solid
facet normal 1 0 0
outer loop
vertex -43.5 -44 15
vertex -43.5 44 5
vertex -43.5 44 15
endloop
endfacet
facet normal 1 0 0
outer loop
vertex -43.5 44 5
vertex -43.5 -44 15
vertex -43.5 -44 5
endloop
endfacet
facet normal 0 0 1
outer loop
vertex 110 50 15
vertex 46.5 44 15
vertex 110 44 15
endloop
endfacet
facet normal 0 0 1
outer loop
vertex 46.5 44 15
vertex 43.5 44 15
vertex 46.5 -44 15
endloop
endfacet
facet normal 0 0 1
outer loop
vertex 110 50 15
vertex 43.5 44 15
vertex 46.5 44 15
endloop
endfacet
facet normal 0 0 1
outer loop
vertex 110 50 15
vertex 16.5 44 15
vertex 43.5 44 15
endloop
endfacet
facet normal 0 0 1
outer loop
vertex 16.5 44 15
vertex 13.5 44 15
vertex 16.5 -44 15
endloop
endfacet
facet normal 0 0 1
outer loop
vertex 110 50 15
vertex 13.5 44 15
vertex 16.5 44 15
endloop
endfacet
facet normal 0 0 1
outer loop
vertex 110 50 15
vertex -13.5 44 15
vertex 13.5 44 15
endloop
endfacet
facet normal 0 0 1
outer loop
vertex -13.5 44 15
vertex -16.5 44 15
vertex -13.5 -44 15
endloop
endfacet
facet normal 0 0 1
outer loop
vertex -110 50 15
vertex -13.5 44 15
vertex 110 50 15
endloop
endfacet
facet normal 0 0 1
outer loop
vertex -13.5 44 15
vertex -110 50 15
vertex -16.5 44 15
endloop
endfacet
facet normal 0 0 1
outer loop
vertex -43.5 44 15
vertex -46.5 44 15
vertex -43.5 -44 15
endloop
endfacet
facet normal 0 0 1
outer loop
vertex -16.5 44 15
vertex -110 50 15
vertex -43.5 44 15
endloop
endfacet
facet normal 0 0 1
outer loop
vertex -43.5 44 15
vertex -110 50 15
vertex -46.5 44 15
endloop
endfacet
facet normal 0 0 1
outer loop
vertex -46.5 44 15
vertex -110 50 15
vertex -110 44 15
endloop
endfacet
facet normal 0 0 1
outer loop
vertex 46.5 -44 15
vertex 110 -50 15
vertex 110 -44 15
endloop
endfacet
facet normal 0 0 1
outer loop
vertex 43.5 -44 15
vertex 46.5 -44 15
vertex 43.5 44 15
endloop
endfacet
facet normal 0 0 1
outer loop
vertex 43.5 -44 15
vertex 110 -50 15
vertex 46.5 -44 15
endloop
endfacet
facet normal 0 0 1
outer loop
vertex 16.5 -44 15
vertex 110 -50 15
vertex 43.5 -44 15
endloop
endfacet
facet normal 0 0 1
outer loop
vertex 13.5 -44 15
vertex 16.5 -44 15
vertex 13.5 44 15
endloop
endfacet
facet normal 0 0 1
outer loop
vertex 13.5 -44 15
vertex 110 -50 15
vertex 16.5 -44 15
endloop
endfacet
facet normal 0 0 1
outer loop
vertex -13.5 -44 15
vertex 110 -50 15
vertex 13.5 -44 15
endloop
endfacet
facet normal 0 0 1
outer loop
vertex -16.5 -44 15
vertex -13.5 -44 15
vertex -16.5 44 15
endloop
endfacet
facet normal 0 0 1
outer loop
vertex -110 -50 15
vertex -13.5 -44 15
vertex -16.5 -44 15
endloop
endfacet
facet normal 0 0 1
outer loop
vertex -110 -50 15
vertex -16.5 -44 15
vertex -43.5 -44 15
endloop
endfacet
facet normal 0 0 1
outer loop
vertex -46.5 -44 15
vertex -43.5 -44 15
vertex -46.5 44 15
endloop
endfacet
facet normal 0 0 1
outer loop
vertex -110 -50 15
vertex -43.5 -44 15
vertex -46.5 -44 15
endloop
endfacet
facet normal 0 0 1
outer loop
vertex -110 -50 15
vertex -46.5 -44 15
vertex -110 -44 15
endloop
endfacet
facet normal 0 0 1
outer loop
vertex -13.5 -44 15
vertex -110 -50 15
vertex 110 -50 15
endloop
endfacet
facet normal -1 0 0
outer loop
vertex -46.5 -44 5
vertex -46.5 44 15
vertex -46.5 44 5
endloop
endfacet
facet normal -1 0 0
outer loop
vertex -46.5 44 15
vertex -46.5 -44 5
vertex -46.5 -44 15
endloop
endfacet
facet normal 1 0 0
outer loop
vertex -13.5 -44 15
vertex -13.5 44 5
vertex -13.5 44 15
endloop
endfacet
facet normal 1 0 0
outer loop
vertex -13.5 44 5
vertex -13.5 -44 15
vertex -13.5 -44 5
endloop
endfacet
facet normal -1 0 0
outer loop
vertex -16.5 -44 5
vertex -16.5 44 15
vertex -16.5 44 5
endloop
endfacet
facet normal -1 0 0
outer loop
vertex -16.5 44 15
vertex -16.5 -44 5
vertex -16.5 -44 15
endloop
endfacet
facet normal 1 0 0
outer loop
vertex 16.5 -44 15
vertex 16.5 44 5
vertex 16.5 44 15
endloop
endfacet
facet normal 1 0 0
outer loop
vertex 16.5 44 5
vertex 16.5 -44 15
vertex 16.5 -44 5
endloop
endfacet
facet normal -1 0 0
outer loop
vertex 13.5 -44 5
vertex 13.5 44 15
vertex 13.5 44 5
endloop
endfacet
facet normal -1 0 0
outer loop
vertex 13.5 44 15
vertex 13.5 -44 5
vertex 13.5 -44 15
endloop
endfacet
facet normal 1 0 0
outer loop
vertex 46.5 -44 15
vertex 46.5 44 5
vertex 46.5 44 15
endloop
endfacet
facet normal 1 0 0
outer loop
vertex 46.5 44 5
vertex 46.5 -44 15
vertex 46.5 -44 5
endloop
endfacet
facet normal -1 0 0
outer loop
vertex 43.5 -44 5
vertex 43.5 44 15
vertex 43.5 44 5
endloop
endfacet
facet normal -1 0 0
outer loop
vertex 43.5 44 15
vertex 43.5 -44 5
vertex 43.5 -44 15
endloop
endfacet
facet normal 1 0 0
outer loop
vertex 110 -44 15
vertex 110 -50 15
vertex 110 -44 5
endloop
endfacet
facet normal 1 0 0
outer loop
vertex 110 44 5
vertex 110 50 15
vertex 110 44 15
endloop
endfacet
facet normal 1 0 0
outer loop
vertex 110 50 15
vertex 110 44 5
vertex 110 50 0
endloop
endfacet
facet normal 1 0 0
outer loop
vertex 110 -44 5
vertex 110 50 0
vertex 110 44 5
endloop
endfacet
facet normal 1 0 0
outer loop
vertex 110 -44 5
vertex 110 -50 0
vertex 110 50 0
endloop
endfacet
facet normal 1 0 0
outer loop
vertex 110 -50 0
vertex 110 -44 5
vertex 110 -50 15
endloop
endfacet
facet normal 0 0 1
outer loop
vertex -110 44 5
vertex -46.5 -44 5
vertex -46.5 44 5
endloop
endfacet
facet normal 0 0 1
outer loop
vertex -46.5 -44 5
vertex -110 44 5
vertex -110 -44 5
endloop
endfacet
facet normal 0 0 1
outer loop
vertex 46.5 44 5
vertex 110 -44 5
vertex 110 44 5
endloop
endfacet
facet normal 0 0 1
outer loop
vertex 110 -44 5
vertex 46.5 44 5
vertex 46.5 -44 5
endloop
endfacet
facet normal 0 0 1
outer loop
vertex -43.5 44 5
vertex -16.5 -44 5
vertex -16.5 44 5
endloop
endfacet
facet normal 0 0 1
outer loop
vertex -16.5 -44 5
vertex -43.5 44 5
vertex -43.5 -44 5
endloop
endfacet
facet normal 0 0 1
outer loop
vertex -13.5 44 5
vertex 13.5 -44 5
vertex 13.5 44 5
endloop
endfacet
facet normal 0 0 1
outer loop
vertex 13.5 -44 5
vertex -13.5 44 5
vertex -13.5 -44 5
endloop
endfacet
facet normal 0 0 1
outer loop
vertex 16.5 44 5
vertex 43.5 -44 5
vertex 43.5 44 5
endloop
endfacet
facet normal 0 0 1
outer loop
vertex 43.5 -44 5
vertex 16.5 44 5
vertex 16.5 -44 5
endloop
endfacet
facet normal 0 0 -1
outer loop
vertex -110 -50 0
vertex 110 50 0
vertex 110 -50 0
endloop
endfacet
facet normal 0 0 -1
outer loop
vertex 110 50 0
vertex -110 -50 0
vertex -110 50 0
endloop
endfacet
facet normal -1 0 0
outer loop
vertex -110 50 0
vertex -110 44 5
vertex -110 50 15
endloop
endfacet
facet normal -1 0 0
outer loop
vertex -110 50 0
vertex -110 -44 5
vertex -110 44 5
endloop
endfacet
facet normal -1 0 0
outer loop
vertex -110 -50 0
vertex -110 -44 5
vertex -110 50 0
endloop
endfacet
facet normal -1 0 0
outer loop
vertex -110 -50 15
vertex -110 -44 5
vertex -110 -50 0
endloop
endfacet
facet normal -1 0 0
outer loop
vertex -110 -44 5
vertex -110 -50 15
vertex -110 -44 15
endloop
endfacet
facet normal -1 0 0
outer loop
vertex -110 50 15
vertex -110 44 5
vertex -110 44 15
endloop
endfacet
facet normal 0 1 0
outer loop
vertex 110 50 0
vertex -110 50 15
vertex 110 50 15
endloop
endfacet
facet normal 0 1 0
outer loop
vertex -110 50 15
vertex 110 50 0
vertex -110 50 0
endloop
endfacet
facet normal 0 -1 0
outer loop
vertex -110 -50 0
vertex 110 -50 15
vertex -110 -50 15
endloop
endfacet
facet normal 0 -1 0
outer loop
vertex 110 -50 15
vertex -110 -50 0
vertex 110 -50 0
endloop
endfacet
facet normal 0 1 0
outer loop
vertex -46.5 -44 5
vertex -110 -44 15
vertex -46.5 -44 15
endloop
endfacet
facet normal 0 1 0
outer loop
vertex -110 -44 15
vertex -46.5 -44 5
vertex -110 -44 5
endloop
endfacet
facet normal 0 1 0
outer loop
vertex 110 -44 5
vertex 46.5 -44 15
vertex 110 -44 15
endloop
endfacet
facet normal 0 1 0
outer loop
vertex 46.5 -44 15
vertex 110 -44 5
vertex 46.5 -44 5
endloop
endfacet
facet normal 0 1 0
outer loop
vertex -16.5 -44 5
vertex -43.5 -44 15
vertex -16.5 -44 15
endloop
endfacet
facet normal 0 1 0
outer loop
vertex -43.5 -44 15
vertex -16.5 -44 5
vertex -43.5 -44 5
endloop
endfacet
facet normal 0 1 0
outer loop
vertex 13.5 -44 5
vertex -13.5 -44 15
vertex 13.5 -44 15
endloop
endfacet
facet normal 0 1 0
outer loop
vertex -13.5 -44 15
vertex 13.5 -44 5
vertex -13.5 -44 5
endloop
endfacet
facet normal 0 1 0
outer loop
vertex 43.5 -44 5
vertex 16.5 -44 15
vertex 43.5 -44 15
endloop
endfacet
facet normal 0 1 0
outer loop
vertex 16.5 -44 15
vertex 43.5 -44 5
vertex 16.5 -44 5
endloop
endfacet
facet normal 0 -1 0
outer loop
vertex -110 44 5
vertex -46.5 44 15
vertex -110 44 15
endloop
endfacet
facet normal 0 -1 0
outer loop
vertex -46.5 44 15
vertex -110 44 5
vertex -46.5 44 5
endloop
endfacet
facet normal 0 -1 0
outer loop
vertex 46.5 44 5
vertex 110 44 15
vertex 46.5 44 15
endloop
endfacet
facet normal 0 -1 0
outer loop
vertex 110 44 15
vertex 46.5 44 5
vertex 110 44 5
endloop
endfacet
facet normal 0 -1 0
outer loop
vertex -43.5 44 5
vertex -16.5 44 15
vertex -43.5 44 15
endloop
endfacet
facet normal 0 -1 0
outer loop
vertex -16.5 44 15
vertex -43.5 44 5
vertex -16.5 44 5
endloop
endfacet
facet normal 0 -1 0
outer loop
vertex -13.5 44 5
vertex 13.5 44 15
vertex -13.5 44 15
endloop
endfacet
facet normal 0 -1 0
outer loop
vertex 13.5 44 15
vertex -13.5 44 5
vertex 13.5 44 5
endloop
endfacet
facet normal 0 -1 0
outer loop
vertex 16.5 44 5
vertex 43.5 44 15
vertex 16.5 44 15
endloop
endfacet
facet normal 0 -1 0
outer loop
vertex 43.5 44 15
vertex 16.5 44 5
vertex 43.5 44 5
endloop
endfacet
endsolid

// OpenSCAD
$fn = 32;

// ----------------------------------------------------------------------
// Rib frame 220 x 100 x 15
// 4 ribs at 30 mm pitch
// ----------------------------------------------------------------------

// --- parameters (mm) ---
frame = [220, 100, 5];  // base plate size (x, y, z)
rail_w = 6;             // side rail width
ribs = 4;               // number of ribs
rib_t = 3;              // rib thickness
rib_h = 10;             // rib height above the base plate
pitch = 30;             // pitch between rib centres

// --- derived feature positions (mm) ---
span = (ribs - 1) * pitch;          // = 90   distance between the outer ribs
origin_x = -span / 2;               // = -45   X of the first rib
rib_len = frame[1] - 2 * rail_w + 2;  // = 90   rib length, 1 mm into each rail
feature_centers = [
  [origin_x + 0 * pitch, 0],
  [origin_x + 1 * pitch, 0],
  [origin_x + 2 * pitch, 0],
  [origin_x + 3 * pitch, 0]
];   // rib centre line, drives the rib loop

// base plate, two side rails, then the ribs read straight off feature_centers
union() {
  translate([-frame[0] / 2, -frame[1] / 2, 0]) cube(frame);
  translate([-frame[0] / 2, -frame[1] / 2, 0]) cube([frame[0], rail_w, frame[2] + rib_h]);
  translate([-frame[0] / 2, frame[1] / 2 - rail_w, 0]) cube([frame[0], rail_w, frame[2] + rib_h]);
  for (centre = feature_centers)
    translate([centre[0] - rib_t / 2, centre[1] - rib_len / 2, frame[2] - 1])
      cube([rib_t, rib_len, rib_h + 1]);
}
